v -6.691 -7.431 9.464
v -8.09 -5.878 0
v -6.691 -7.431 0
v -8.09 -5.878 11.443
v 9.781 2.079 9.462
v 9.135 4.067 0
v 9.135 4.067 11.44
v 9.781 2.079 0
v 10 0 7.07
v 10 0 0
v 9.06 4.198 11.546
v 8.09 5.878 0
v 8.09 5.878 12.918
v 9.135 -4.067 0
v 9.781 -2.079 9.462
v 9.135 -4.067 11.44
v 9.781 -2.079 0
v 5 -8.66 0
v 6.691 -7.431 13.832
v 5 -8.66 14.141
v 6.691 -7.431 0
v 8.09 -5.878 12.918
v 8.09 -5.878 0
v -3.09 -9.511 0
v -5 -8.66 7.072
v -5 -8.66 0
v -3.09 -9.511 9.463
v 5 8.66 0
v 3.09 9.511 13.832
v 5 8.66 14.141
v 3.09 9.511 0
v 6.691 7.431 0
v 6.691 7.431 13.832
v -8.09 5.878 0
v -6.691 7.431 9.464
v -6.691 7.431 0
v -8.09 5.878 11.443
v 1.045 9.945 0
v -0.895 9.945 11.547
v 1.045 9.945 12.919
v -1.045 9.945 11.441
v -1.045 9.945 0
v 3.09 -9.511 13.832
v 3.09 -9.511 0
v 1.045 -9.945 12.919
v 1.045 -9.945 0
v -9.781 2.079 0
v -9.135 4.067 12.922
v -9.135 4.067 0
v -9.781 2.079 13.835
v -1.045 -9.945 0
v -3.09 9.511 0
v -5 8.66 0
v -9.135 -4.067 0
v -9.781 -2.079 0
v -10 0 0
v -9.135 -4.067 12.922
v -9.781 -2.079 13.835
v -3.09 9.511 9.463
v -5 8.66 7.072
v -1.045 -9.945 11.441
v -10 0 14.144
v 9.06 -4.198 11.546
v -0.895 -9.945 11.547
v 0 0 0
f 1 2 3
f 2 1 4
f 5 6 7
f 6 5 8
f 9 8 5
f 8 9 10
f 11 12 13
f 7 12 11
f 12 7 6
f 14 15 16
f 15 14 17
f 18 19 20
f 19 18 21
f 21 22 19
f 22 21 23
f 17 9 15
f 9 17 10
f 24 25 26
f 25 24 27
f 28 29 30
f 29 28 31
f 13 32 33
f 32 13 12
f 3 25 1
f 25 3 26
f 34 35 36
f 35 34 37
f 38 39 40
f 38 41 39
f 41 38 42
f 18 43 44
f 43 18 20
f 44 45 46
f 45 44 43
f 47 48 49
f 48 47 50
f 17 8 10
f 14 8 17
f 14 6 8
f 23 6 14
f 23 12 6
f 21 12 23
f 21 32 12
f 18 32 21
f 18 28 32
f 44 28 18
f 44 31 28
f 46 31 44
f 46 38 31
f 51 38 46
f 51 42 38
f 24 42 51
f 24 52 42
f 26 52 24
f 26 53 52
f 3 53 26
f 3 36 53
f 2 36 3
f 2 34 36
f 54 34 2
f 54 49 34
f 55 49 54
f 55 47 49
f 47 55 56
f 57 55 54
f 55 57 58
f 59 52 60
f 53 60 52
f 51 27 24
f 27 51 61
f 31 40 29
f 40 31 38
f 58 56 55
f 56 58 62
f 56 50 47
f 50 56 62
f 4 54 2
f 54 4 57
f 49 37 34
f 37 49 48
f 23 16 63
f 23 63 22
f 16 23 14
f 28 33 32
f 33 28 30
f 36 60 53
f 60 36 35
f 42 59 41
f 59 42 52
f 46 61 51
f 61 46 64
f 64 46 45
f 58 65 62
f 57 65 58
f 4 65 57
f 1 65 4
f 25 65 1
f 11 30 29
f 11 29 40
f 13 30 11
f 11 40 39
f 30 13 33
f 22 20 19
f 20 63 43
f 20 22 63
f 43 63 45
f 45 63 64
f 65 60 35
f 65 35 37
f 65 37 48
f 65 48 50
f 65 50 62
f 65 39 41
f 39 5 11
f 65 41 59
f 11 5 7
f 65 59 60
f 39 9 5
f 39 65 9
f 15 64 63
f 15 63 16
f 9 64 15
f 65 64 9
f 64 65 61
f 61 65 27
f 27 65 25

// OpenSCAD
difference (){
    cylinder(20, 10, 10);
    rotate([45, -35.26, 0]){
        cube(20);
    }    
}    
